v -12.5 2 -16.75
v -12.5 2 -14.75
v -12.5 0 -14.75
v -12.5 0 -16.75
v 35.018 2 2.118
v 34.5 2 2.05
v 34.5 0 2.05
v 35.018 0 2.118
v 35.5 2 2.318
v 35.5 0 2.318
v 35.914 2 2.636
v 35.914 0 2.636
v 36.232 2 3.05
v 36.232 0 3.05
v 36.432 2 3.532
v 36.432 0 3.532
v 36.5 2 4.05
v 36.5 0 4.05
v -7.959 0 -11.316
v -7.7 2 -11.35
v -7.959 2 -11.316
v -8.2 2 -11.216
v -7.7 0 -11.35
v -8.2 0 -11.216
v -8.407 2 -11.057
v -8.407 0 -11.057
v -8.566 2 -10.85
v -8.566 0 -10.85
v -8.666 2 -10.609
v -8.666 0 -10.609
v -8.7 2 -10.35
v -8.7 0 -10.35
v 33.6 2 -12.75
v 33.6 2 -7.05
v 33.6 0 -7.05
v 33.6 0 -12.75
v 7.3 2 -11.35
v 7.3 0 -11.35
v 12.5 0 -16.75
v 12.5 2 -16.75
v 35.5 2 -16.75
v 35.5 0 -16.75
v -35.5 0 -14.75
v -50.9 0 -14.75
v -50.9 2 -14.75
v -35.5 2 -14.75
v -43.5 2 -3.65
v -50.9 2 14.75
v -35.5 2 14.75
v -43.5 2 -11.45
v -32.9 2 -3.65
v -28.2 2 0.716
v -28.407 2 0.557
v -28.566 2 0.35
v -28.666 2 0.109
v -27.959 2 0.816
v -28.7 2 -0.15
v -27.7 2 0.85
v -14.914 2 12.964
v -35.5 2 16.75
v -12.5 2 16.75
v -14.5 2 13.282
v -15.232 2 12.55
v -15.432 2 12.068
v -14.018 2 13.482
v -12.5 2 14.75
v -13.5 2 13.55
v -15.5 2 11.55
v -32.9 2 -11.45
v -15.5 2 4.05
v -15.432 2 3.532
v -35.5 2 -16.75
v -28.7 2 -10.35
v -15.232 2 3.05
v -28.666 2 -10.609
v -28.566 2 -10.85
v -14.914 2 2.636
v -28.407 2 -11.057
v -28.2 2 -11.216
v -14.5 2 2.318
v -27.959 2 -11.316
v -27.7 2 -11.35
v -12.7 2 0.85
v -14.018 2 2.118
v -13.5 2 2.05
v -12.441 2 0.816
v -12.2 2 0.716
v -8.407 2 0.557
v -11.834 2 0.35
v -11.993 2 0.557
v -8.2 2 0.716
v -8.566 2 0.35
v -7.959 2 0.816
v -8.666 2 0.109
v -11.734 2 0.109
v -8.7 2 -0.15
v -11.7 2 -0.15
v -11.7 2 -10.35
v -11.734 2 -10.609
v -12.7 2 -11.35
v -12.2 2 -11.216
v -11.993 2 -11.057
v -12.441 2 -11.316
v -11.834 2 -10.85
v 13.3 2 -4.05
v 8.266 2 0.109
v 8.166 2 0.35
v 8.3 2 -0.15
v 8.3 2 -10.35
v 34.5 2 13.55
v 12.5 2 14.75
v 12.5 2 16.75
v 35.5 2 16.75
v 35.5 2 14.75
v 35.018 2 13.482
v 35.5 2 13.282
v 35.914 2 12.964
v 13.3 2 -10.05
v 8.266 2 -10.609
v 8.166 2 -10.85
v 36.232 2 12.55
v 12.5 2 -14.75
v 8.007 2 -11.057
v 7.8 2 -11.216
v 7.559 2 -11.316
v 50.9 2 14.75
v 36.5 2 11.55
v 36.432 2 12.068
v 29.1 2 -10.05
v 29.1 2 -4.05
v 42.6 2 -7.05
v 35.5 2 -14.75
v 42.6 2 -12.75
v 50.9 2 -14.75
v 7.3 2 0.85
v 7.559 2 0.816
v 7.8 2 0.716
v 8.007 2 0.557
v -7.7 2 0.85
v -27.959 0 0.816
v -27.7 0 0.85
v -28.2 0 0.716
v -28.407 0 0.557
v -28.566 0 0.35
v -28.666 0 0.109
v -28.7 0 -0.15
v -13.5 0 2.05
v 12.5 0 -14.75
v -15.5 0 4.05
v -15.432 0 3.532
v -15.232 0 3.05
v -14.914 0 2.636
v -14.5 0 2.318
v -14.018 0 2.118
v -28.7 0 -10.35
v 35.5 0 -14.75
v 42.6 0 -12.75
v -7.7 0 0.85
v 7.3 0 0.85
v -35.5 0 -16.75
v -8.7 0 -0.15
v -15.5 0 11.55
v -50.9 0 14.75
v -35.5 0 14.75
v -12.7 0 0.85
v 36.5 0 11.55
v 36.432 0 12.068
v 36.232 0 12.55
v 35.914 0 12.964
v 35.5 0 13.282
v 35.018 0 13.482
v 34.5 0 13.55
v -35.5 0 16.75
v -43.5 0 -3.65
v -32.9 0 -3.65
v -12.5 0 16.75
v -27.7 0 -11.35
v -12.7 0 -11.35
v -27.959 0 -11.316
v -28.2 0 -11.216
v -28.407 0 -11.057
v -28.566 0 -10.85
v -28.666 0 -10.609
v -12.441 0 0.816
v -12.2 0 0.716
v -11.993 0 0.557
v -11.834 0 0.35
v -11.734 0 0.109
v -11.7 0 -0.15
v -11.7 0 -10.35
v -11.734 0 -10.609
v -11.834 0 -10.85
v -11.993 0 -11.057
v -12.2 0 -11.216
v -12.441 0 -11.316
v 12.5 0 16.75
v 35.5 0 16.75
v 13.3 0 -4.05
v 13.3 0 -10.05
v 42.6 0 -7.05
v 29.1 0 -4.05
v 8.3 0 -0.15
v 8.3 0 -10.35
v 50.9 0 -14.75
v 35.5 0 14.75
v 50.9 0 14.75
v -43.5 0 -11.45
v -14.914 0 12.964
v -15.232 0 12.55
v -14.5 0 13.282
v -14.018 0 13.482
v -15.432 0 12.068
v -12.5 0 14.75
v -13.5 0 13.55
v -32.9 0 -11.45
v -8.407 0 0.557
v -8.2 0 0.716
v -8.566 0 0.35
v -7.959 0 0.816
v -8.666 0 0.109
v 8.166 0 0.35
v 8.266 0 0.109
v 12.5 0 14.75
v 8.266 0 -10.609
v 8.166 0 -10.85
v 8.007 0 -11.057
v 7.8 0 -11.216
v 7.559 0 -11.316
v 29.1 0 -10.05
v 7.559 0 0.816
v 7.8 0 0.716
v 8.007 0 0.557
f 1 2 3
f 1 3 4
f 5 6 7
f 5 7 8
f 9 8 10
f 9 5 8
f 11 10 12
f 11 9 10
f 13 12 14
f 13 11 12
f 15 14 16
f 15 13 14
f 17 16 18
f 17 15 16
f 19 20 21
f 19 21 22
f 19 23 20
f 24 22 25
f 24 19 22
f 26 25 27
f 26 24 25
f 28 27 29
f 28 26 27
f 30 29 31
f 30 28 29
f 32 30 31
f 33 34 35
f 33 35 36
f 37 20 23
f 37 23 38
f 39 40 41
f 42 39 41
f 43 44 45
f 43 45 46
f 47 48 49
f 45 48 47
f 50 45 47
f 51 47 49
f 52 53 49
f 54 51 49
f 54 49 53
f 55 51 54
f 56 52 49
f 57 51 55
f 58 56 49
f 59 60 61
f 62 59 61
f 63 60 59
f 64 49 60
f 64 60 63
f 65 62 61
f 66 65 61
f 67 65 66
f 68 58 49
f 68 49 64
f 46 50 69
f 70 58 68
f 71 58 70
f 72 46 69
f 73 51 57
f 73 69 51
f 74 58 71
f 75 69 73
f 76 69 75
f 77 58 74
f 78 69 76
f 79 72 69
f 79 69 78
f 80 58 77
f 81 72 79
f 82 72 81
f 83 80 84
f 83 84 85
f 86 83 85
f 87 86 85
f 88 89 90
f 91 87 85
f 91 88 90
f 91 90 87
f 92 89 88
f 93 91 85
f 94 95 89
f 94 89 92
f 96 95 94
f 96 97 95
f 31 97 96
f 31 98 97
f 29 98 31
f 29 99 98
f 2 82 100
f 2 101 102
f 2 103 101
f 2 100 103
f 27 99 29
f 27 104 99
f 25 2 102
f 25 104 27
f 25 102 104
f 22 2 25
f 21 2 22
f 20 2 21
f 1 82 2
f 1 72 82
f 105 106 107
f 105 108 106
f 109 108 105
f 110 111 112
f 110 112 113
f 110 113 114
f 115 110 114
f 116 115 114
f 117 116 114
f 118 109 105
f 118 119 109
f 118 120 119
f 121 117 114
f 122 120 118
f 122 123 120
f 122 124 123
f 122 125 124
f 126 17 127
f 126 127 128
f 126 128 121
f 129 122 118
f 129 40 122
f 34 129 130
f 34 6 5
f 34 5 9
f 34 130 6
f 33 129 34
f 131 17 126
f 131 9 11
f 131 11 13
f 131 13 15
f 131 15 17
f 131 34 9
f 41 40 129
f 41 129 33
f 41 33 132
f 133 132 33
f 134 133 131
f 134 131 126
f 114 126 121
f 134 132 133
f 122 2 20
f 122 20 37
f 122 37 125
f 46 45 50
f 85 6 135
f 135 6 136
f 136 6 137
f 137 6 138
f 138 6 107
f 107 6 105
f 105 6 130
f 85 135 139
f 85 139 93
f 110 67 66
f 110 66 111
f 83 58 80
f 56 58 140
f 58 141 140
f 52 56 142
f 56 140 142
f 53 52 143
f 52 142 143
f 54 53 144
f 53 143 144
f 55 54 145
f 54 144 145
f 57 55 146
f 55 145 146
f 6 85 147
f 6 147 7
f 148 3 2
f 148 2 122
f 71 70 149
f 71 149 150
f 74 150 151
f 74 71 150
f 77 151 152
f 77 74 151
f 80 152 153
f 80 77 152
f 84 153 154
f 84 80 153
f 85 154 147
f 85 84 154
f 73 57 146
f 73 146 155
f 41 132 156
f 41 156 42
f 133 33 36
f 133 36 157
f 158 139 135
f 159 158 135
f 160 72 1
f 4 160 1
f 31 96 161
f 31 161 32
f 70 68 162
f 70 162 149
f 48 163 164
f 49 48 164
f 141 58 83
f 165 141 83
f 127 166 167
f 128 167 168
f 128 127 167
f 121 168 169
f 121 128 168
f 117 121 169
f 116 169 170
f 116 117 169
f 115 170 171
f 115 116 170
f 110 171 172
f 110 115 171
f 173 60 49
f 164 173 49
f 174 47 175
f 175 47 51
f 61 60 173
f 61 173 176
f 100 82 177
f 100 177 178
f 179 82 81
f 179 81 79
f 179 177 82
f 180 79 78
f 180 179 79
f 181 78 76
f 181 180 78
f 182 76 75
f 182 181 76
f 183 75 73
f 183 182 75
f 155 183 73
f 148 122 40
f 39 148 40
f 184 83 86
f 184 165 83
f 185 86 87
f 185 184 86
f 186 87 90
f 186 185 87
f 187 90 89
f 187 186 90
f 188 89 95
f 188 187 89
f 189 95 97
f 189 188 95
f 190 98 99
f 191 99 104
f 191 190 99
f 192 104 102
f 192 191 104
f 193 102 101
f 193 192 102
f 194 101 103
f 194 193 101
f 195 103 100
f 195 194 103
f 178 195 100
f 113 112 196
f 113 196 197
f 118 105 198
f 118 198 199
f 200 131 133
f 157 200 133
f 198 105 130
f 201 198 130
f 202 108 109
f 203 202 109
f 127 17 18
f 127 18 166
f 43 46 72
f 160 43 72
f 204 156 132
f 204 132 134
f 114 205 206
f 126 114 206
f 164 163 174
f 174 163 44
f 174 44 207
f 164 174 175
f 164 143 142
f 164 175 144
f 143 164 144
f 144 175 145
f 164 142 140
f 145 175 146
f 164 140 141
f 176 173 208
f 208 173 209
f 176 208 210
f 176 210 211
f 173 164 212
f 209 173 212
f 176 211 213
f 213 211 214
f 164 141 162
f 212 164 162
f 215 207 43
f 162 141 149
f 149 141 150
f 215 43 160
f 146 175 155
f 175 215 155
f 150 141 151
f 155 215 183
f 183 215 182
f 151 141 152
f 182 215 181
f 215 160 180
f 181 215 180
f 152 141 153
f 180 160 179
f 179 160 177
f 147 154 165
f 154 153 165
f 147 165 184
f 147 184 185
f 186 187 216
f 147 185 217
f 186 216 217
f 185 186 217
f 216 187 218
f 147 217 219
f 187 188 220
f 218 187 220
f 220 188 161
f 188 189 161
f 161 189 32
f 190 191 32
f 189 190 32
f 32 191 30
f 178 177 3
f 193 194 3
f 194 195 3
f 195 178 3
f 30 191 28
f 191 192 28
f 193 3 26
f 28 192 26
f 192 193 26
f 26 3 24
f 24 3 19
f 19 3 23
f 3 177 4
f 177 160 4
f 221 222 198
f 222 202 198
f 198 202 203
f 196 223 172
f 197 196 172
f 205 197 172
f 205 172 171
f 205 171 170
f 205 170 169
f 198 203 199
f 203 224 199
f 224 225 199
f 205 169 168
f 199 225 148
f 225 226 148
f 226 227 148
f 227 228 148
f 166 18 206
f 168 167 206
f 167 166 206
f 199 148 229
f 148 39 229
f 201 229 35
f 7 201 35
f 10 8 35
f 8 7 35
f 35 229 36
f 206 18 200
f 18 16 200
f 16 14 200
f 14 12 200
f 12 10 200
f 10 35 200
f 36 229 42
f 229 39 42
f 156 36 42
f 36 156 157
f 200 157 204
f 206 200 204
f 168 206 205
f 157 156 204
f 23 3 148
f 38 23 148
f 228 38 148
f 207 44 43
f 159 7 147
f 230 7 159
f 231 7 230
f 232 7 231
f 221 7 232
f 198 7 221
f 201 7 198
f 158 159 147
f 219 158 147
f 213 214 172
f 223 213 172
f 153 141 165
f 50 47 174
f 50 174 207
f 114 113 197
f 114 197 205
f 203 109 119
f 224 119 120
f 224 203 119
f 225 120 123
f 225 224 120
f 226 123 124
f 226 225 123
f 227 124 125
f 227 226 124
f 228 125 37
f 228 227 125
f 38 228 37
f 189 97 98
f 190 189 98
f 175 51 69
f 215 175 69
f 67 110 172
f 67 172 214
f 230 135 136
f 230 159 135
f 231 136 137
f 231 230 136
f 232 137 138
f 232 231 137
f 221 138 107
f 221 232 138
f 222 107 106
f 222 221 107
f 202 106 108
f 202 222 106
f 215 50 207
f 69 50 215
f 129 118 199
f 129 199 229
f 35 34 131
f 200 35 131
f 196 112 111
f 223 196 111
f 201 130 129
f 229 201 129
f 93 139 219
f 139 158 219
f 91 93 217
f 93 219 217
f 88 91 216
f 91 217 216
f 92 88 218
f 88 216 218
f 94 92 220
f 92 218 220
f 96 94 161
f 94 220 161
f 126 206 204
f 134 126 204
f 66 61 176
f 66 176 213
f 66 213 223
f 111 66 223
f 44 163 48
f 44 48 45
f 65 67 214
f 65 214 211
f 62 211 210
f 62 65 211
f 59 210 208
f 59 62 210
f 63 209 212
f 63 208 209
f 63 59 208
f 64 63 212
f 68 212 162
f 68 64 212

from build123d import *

# Parameters (mm, degrees)
SKETCH_1_W                     = 101.8
SKETCH_1_H                     = 29.5
EXTRUDE_1_DEPTH                = 2
SKETCH_2_W                     = 23
SKETCH_2_H                     = 2
EXTRUDE_2_DEPTH                = 2
SKETCH_3_W                     = 9
SKETCH_3_H                     = 5.7
CUT_EXTRUDE_1_DEPTH            = 3
SKETCH_4_W                     = 10.6
SKETCH_4_H                     = 7.8
CUT_EXTRUDE_2_DEPTH            = 3
SKETCH_6_W                     = 17
SKETCH_6_H                     = 12.2
CUT_EXTRUDE_4_DEPTH            = 3
FILLET_1_R                     = 1
PATTERN_LINEAR_1_COUNT         = 2
PATTERN_LINEAR_1_PITCH         = 20
FILLET_1_OF_PATTERN_LINEAR_1_R = 1
SKETCH_7_W                     = 15.8
SKETCH_7_H                     = 6
CUT_EXTRUDE_5_DEPTH            = 3
CUT_EXTRUDE_6_DEPTH            = 3


with BuildPart() as part:
    # 草图1 → 凸台-拉伸1 (new body)
    with BuildSketch(Plane(origin=(0, 0, 0), x_dir=(1, 0, 0), z_dir=(0, 1, 0))):
        Rectangle(SKETCH_1_W, SKETCH_1_H)
    extrude(amount=EXTRUDE_1_DEPTH)

    # 草图2 → 凸台-拉伸2 (add)
    with BuildSketch(Plane(origin=(0, 2, 0), x_dir=(1, 0, 0), z_dir=(0, 1, 0))):
        with Locations((-24, 15.75)):
            Rectangle(SKETCH_2_W, SKETCH_2_H)
        with Locations((24, 15.75)):
            Rectangle(SKETCH_2_W, SKETCH_2_H)
        with Locations((24, -15.75)):
            Rectangle(SKETCH_2_W, SKETCH_2_H)
        with Locations((-24, -15.75)):
            Rectangle(SKETCH_2_W, SKETCH_2_H)
    extrude(amount=-EXTRUDE_2_DEPTH)

    # 草图3 → 切除-拉伸1 (cut, through all)
    with BuildSketch(Plane(origin=(0, 2, 0), x_dir=(1, 0, 0), z_dir=(0, 1, 0))):
        with Locations((38.1, 9.9)):
            Rectangle(SKETCH_3_W, SKETCH_3_H)
    extrude(amount=-CUT_EXTRUDE_1_DEPTH, mode=Mode.SUBTRACT)

    # 草图4 → 切除-拉伸2 (cut, through all)
    with BuildSketch(Plane(origin=(0, 2, 0), x_dir=(1, 0, 0), z_dir=(0, 1, 0))):
        with Locations((-38.2, 7.55)):
            Rectangle(SKETCH_4_W, SKETCH_4_H)
    extrude(amount=-CUT_EXTRUDE_2_DEPTH, mode=Mode.SUBTRACT)

    # 草图6 → 切除-拉伸4 (cut, through all)
    with BuildSketch(Plane(origin=(0, 2, 0), x_dir=(1, 0, 0), z_dir=(0, 1, 0))):
        with Locations((-20.2, 5.25)):
            Rectangle(SKETCH_6_W, SKETCH_6_H)
    cut_extrude_4 = extrude(amount=-CUT_EXTRUDE_4_DEPTH, mode=Mode.SUBTRACT)

    # 圆角1
    fillet_1_edges = [part.edges().sort_by_distance(p)[0] for p in [
        (-28.7, 1, 0.85),
        (-28.7, 1, -11.35),
        (-11.7, 1, -11.35),
        (-11.7, 1, 0.85),
    ]]
    fillet(fillet_1_edges, radius=FILLET_1_R)

    # 阵列(线性)1: 切除-拉伸4 ×2
    with Locations(*[(i * PATTERN_LINEAR_1_PITCH, 0, 0) for i in range(1, PATTERN_LINEAR_1_COUNT)]):
        add(cut_extrude_4, mode=Mode.SUBTRACT)

    # 圆角1 of 阵列(线性)1
    fillet_1_of_pattern_linear_1_edges = [part.edges().sort_by_distance(p)[0] for p in [
        (-8.7, 1, 0.85),
        (-8.7, 1, -11.35),
        (8.3, 1, -11.35),
        (8.3, 1, 0.85),
    ]]
    fillet(fillet_1_of_pattern_linear_1_edges, radius=FILLET_1_OF_PATTERN_LINEAR_1_R)

    # 草图7 → 切除-拉伸5 (cut, through all)
    with BuildSketch(Plane(origin=(0, 2, 0), x_dir=(1, 0, 0), z_dir=(0, 1, 0))):
        with Locations((21.2, 7.05)):
            Rectangle(SKETCH_7_W, SKETCH_7_H)
    extrude(amount=-CUT_EXTRUDE_5_DEPTH, mode=Mode.SUBTRACT)

    # 草图8 → 切除-拉伸6 (cut, through all)
    with BuildSketch(Plane(origin=(0, 2, 0), x_dir=(1, 0, 0), z_dir=(0, 1, 0))):
        with BuildLine():
            Line((-13.5, -2.05), (34.5, -2.05))
            ThreePointArc((34.5, -2.05), (35.914213562, -2.635786438), (36.5, -4.05))
            Line((36.5, -4.05), (36.5, -11.55))
            ThreePointArc((36.5, -11.55), (35.914213562, -12.964213562), (34.5, -13.55))
            Line((34.5, -13.55), (-13.5, -13.55))
            ThreePointArc((-13.5, -13.55), (-14.914213562, -12.964213562), (-15.5, -11.55))
            Line((-15.5, -11.55), (-15.5, -4.05))
            ThreePointArc((-15.5, -4.05), (-14.914213562, -2.635786438), (-13.5, -2.05))
        make_face()
    extrude(amount=-CUT_EXTRUDE_6_DEPTH, mode=Mode.SUBTRACT)


solid = part.part
